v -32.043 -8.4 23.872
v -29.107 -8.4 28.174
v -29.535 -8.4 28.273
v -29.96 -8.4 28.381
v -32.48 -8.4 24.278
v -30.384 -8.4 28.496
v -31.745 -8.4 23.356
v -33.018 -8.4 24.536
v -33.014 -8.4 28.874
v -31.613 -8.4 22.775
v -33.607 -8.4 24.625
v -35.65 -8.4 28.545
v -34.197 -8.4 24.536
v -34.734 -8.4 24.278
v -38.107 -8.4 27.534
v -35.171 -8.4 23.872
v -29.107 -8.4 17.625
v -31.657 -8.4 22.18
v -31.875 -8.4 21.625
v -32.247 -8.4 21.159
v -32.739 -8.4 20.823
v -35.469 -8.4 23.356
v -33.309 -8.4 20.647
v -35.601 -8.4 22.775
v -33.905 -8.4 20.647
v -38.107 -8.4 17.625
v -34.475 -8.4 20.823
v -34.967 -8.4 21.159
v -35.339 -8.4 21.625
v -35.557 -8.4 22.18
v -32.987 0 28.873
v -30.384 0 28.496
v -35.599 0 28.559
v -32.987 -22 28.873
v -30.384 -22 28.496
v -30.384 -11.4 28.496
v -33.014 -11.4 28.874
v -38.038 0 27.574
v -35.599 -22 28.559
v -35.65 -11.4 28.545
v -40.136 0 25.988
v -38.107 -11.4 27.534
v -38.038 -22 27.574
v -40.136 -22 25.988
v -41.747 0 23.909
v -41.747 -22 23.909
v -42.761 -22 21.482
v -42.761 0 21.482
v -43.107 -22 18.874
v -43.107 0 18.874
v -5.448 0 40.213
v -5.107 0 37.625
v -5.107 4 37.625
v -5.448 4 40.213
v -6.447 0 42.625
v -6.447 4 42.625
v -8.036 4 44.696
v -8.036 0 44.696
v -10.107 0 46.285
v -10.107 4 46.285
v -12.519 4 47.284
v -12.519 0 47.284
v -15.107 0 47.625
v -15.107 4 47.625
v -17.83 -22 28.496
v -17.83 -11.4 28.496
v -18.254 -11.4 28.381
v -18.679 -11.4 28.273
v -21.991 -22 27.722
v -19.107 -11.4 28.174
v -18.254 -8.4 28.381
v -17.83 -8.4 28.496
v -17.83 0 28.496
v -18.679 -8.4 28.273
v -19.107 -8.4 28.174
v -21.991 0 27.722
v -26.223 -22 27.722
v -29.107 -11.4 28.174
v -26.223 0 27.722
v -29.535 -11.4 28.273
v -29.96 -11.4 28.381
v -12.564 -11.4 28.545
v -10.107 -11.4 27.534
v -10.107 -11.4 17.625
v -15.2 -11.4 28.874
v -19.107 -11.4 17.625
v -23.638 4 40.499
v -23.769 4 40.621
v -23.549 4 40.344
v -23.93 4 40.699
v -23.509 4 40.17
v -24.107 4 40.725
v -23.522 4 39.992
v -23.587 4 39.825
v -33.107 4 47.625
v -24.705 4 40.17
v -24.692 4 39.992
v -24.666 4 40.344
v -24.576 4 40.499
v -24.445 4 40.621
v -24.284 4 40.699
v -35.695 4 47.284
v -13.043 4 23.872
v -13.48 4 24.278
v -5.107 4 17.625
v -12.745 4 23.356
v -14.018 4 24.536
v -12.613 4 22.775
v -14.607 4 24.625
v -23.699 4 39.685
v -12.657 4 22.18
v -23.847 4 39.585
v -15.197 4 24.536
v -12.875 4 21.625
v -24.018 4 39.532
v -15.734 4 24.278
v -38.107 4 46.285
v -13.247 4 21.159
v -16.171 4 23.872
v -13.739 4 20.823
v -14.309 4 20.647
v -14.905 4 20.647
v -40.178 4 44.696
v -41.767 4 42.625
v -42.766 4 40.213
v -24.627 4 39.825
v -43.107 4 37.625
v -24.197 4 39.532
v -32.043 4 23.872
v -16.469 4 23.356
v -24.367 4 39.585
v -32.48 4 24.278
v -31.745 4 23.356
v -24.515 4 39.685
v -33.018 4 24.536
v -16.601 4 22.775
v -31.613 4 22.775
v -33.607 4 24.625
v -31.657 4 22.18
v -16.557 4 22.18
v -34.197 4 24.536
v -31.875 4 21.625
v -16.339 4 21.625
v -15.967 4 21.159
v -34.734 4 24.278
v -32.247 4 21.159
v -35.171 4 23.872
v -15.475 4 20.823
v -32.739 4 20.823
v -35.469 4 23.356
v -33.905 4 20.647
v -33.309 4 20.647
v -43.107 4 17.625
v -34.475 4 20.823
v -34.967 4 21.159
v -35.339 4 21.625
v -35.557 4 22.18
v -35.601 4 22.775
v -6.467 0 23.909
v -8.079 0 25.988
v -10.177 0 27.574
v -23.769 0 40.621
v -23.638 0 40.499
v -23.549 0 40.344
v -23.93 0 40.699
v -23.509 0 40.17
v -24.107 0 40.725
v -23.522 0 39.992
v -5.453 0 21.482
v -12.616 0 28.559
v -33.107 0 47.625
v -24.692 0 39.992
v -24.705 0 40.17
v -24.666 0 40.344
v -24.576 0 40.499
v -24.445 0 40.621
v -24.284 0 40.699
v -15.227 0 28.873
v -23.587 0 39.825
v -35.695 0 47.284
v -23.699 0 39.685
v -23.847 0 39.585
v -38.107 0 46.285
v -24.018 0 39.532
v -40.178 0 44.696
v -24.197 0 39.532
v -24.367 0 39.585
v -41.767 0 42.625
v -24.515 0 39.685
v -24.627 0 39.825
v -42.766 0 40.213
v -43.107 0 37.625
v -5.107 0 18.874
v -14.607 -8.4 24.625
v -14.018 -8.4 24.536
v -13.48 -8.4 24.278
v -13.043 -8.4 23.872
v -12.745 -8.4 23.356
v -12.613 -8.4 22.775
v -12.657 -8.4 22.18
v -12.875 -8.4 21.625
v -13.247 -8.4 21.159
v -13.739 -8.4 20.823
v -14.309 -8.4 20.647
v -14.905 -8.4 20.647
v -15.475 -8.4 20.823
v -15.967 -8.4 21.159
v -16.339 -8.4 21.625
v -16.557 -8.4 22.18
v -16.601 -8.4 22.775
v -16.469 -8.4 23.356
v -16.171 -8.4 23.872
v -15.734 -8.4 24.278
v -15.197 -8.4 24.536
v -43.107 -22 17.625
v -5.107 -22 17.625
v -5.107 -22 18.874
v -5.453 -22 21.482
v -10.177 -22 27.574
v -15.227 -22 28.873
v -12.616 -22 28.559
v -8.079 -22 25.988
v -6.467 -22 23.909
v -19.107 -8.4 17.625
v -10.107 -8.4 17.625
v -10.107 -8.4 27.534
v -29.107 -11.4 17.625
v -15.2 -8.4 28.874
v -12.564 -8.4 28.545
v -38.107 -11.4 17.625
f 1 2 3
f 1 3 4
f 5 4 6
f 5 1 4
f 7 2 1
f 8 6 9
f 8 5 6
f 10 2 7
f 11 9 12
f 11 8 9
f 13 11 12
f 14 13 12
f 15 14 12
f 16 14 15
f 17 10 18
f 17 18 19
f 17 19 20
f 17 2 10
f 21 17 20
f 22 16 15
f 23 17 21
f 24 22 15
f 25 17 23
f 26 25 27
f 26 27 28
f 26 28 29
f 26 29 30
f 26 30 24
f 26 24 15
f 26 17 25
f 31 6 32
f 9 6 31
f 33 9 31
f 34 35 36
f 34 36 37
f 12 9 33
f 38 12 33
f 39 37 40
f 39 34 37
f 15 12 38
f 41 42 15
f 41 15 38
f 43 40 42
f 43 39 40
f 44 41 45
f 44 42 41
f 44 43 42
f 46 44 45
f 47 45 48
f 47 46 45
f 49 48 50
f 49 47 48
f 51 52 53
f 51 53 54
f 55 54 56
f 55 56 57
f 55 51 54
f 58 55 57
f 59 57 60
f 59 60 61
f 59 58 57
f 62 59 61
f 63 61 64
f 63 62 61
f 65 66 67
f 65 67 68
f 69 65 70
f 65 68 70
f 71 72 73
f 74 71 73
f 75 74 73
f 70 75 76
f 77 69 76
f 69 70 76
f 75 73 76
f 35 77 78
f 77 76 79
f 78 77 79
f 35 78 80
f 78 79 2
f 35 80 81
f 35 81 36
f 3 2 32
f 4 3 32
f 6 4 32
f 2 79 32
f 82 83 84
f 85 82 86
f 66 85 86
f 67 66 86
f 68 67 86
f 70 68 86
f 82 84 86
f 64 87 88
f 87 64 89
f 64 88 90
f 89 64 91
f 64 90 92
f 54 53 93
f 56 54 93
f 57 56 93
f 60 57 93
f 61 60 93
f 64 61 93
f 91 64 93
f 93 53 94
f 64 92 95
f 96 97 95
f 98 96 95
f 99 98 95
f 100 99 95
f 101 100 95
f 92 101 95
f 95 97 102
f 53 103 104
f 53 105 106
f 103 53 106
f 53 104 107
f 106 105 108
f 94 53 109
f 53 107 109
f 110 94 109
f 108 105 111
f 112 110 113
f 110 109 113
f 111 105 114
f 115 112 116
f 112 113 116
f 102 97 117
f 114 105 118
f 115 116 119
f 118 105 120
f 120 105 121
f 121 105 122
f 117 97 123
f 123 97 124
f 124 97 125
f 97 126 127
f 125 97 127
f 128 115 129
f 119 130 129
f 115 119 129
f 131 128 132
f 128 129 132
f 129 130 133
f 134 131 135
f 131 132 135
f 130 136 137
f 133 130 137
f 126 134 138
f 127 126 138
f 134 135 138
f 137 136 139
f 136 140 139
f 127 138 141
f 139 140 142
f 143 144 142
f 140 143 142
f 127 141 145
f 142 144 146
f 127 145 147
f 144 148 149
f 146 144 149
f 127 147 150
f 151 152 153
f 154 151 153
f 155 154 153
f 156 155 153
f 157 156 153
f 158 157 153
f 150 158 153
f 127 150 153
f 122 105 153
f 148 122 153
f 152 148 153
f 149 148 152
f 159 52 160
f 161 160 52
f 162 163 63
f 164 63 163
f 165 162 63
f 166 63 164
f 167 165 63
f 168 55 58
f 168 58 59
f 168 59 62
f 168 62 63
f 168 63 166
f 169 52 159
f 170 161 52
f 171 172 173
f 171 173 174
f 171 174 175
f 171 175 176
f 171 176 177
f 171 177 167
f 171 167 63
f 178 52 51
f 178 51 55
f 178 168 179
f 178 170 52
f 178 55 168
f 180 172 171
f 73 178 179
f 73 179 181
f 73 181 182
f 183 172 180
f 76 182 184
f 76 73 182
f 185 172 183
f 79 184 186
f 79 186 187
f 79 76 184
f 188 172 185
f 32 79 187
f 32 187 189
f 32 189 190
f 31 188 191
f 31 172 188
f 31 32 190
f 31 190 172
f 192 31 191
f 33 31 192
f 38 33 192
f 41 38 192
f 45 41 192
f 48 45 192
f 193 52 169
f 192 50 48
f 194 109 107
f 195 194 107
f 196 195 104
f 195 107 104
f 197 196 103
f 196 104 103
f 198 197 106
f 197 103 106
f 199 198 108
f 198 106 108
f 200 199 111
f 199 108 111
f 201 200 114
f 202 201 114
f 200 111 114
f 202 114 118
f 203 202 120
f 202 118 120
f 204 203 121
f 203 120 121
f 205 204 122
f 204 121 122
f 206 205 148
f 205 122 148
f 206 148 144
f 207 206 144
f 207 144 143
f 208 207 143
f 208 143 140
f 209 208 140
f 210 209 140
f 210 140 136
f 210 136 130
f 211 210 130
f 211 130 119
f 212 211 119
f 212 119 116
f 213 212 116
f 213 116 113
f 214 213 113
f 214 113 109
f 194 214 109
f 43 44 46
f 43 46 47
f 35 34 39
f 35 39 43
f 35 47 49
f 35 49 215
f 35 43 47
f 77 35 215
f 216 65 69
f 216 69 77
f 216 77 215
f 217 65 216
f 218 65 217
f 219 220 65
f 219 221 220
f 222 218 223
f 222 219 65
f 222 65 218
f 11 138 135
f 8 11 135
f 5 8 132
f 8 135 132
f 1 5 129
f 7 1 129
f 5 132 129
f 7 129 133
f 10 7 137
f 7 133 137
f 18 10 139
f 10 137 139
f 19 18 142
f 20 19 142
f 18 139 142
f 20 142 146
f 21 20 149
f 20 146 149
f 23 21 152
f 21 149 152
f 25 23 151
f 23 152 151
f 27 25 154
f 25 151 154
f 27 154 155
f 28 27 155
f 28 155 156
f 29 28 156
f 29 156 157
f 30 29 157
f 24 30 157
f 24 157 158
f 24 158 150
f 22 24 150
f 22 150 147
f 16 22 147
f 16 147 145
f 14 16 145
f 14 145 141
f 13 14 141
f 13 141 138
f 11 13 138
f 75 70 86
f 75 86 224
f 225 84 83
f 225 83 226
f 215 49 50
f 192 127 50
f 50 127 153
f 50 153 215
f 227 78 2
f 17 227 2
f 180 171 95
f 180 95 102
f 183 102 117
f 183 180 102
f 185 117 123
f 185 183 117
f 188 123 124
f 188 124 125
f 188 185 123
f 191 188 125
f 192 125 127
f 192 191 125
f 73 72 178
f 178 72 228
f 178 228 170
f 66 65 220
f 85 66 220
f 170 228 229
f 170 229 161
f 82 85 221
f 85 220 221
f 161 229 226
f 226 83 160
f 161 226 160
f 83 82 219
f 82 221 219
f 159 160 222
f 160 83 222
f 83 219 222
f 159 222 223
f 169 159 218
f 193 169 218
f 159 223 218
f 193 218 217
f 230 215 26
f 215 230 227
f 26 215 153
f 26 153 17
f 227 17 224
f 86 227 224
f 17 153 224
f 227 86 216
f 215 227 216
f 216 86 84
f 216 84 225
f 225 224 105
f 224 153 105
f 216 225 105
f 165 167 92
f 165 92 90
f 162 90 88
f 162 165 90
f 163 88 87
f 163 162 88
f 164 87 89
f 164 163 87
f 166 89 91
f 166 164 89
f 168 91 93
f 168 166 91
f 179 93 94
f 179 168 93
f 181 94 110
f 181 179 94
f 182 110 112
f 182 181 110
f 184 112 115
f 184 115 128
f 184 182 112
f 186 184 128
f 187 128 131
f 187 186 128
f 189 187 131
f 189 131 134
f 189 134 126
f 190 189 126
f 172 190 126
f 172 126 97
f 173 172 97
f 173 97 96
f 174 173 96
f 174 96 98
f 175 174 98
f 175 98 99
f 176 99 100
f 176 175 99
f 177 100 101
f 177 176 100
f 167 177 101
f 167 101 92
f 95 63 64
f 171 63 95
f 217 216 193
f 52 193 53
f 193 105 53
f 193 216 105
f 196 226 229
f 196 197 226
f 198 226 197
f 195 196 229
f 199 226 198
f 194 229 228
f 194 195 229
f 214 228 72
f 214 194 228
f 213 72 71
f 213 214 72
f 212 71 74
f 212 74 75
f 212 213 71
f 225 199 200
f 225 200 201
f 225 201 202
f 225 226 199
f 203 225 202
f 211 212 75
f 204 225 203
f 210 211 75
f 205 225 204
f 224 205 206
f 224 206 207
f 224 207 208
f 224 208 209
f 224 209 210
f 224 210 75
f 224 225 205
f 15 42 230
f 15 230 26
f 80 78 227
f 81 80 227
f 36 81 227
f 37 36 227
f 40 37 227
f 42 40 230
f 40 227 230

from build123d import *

# Parameters (mm, degrees)
CROQUIS2_R              = 0.6
SALIENTE_EXTRUIR1_DEPTH = 4
SALIENTE_EXTRUIR2_DEPTH = 22
REDONDEO1_R             = 10
REDONDEO2_R             = 10
CROQUIS4_R              = 2
CORTAR_EXTRUIR1_DEPTH   = 15.4
CROQUIS5_W              = 9
CROQUIS5_H              = 3
CORTAR_EXTRUIR2_DEPTH   = 12


with BuildPart() as part:
    # Croquis2 → Saliente-Extruir1 (new body)
    with BuildSketch(Plane(origin=(0, 0, 0), x_dir=(1, 0, 0), z_dir=(0, 1, 0))):
        with BuildLine():
            Line((-43.107082341, -17.625158928), (-5.107082341, -17.625158928))
            Line((-5.107082341, -17.625158928), (-5.107082341, -37.625158928))
            ThreePointArc((-5.107082341, -37.625158928), (-8.036014529, -44.69622674), (-15.107082341, -47.625158928))
            Line((-15.107082341, -47.625158928), (-33.107082341, -47.625158928))
            ThreePointArc((-33.107082341, -47.625158928), (-40.178150153, -44.69622674), (-43.107082341, -37.625158928))
            Line((-43.107082341, -37.625158928), (-43.107082341, -17.625158928))
        make_face()
        with Locations(Location((-24.107082341, -40.125158928, 0), (0, 0, 270))):
            Circle(CROQUIS2_R, mode=Mode.SUBTRACT)
    extrude(amount=SALIENTE_EXTRUIR1_DEPTH)

    # Croquis3 → Saliente-Extruir2 (add)
    with BuildSketch(Plane.XZ):
        with BuildLine():
            Line((-43.107082341, 17.625158928), (-5.107082341, 17.625158928))
            Line((-5.107082341, 17.625158928), (-5.107082341, 37.625158928))
            ThreePointArc((-5.107082341, 37.625158928), (-24.107082341, 27.625158928), (-43.107082341, 37.625158928))
            Line((-43.107082341, 37.625158928), (-43.107082341, 17.625158928))
        make_face()
    extrude(amount=SALIENTE_EXTRUIR2_DEPTH)

    # Redondeo1
    redondeo1_edges = [part.edges().sort_by_distance(p)[0] for p in [
        (-43.107082341, -11, 37.625158928),
    ]]
    fillet(redondeo1_edges, radius=REDONDEO1_R)

    # Redondeo2
    redondeo2_edges = [part.edges().sort_by_distance(p)[0] for p in [
        (-5.107082341, -11, 37.625158928),
    ]]
    fillet(redondeo2_edges, radius=REDONDEO2_R)

    # Croquis4 → Cortar-Extruir1 (cut)
    with BuildSketch(Plane(origin=(0, 4, 0), x_dir=(1, 0, 0), z_dir=(0, 1, 0))):
        with Locations(Location((-33.607082341, -22.625158928, 0), (0, 0, 270))):
            Circle(CROQUIS4_R)
        with Locations(Location((-14.607082341, -22.625158928, 0), (0, 0, 270))):
            Circle(CROQUIS4_R)
    extrude(amount=-CORTAR_EXTRUIR1_DEPTH, mode=Mode.SUBTRACT)

    # Croquis5 → Cortar-Extruir2 (cut)
    with BuildSketch(Plane(origin=(0, 0, 17.625158928), x_dir=(-1, 0, 0), z_dir=(0, 0, -1))):
        with Locations((33.607082341, -9.9)):
            Rectangle(CROQUIS5_W, CROQUIS5_H)
        with Locations((14.607082341, -9.9)):
            Rectangle(CROQUIS5_W, CROQUIS5_H)
    extrude(amount=-CORTAR_EXTRUIR2_DEPTH, mode=Mode.SUBTRACT)


solid = part.part
